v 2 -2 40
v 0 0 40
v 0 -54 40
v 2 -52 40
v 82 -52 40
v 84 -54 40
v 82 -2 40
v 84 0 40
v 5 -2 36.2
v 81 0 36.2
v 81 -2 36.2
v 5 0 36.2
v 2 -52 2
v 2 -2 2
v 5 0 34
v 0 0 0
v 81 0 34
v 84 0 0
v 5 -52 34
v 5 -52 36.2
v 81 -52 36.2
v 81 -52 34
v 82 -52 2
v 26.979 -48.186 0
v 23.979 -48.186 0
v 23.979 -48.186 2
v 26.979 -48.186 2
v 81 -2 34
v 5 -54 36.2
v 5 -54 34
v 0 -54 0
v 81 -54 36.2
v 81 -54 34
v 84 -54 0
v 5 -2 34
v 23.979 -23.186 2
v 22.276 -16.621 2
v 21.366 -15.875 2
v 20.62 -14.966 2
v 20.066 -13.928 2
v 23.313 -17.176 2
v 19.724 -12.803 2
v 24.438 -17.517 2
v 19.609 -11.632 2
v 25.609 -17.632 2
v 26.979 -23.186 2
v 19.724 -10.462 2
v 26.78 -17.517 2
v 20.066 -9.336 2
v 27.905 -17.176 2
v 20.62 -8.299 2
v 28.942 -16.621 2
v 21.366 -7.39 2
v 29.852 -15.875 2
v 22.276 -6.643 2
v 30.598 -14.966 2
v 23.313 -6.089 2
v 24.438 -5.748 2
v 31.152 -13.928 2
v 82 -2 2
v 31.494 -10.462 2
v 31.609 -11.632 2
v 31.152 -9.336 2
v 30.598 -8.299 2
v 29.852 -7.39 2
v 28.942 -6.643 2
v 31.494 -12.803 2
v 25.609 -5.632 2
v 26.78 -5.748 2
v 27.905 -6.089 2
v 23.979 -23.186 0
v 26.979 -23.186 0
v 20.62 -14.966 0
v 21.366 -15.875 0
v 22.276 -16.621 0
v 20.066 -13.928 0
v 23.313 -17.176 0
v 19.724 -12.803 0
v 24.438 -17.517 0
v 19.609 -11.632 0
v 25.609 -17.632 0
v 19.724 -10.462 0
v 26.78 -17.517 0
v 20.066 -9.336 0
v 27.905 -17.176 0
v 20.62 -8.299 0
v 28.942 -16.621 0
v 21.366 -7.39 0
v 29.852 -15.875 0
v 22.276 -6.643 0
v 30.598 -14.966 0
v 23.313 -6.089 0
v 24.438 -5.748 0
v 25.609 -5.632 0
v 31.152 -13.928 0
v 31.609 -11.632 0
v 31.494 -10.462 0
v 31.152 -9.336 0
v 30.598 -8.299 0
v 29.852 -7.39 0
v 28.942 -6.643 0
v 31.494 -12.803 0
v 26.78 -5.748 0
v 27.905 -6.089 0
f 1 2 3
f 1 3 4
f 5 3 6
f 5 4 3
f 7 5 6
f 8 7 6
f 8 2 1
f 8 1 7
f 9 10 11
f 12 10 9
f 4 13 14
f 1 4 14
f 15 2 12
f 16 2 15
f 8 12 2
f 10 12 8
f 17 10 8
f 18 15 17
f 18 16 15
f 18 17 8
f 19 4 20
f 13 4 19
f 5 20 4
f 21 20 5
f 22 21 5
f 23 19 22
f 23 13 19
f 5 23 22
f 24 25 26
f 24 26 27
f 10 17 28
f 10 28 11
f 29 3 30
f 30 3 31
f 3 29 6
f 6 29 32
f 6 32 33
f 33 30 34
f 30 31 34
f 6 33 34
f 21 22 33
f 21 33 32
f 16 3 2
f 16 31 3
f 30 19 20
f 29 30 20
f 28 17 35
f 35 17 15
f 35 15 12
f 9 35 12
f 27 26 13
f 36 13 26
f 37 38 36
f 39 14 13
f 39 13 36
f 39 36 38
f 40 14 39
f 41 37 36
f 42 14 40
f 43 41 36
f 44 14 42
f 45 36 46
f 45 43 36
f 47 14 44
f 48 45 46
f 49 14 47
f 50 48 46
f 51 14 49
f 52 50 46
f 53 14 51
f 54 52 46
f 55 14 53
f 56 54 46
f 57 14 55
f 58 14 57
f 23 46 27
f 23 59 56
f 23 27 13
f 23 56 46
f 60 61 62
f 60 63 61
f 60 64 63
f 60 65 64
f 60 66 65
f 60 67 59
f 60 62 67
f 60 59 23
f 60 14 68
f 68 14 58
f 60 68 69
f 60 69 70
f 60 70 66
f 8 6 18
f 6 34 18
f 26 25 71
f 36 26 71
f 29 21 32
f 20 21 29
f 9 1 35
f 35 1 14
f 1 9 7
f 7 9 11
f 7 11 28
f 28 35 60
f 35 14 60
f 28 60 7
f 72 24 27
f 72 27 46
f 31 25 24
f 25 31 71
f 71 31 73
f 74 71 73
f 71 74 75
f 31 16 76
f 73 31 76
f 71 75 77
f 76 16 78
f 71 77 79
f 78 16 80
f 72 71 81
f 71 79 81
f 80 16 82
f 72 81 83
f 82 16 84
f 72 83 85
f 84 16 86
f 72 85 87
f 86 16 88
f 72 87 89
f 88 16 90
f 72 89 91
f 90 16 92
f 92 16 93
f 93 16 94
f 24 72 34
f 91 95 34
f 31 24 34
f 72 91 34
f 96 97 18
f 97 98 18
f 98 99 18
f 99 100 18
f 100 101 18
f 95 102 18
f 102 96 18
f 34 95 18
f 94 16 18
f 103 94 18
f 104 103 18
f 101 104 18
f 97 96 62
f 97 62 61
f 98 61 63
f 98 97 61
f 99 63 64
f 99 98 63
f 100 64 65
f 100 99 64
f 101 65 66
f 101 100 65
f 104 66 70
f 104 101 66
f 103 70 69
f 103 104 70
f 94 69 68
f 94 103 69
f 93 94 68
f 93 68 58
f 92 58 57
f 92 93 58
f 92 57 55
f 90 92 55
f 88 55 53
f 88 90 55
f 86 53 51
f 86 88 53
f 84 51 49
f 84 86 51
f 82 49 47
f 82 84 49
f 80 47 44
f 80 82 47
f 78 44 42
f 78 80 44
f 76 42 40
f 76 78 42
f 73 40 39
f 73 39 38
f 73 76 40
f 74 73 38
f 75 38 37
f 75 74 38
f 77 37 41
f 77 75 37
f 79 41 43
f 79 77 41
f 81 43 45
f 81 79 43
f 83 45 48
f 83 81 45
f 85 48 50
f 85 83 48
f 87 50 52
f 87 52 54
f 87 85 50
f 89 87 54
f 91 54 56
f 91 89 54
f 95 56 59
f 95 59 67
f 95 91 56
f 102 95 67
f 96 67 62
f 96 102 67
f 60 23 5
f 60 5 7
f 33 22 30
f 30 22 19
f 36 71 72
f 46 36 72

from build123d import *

# Parameters (mm, degrees)
SKETCH011_W     = 84
SKETCH011_H     = 54
SKETCH011_R     = 6
SKETCH011_W_2   = 3
SKETCH011_H_2   = 25
PAD004_DEPTH    = 2
SKETCH012_W     = 84
SKETCH012_H     = 54
SKETCH012_W_2   = 80
SKETCH012_H_2   = 50
PAD005_DEPTH    = 38
SKETCH013_W     = 76
SKETCH013_H     = 2.2
POCKET007_DEPTH = 54.001


with BuildPart() as part:
    # Sketch011 (on XY_Plane005 of Origin010) → Pad004 (new body)
    with BuildSketch(Plane.XY):
        with Locations((42, -27)):
            Rectangle(SKETCH011_W, SKETCH011_H)
        with Locations((25.609009, -11.632301)):
            Circle(SKETCH011_R, mode=Mode.SUBTRACT)
        with Locations((25.479133, -35.686392)):
            Rectangle(SKETCH011_W_2, SKETCH011_H_2, mode=Mode.SUBTRACT)
    extrude(amount=PAD004_DEPTH)

    # Sketch012 (on Face11 of Pad004) → Pad005 (join)
    with BuildSketch(Plane.XY.offset(2)):
        with Locations((42, -27)):
            Rectangle(SKETCH012_W, SKETCH012_H)
        with Locations((42, -27)):
            Rectangle(SKETCH012_W_2, SKETCH012_H_2, mode=Mode.SUBTRACT)
    extrude(amount=PAD005_DEPTH)

    # Sketch013 (on Face14 of Pad005) → Pocket007 (cut, through all)
    with BuildSketch(Plane(origin=(0, 0, 0), x_dir=(-1, 0, 0), z_dir=(0, 1, 0))):
        with Locations((-43, 35.1)):
            Rectangle(SKETCH013_W, SKETCH013_H)
    extrude(amount=-POCKET007_DEPTH, mode=Mode.SUBTRACT)


solid = part.part
